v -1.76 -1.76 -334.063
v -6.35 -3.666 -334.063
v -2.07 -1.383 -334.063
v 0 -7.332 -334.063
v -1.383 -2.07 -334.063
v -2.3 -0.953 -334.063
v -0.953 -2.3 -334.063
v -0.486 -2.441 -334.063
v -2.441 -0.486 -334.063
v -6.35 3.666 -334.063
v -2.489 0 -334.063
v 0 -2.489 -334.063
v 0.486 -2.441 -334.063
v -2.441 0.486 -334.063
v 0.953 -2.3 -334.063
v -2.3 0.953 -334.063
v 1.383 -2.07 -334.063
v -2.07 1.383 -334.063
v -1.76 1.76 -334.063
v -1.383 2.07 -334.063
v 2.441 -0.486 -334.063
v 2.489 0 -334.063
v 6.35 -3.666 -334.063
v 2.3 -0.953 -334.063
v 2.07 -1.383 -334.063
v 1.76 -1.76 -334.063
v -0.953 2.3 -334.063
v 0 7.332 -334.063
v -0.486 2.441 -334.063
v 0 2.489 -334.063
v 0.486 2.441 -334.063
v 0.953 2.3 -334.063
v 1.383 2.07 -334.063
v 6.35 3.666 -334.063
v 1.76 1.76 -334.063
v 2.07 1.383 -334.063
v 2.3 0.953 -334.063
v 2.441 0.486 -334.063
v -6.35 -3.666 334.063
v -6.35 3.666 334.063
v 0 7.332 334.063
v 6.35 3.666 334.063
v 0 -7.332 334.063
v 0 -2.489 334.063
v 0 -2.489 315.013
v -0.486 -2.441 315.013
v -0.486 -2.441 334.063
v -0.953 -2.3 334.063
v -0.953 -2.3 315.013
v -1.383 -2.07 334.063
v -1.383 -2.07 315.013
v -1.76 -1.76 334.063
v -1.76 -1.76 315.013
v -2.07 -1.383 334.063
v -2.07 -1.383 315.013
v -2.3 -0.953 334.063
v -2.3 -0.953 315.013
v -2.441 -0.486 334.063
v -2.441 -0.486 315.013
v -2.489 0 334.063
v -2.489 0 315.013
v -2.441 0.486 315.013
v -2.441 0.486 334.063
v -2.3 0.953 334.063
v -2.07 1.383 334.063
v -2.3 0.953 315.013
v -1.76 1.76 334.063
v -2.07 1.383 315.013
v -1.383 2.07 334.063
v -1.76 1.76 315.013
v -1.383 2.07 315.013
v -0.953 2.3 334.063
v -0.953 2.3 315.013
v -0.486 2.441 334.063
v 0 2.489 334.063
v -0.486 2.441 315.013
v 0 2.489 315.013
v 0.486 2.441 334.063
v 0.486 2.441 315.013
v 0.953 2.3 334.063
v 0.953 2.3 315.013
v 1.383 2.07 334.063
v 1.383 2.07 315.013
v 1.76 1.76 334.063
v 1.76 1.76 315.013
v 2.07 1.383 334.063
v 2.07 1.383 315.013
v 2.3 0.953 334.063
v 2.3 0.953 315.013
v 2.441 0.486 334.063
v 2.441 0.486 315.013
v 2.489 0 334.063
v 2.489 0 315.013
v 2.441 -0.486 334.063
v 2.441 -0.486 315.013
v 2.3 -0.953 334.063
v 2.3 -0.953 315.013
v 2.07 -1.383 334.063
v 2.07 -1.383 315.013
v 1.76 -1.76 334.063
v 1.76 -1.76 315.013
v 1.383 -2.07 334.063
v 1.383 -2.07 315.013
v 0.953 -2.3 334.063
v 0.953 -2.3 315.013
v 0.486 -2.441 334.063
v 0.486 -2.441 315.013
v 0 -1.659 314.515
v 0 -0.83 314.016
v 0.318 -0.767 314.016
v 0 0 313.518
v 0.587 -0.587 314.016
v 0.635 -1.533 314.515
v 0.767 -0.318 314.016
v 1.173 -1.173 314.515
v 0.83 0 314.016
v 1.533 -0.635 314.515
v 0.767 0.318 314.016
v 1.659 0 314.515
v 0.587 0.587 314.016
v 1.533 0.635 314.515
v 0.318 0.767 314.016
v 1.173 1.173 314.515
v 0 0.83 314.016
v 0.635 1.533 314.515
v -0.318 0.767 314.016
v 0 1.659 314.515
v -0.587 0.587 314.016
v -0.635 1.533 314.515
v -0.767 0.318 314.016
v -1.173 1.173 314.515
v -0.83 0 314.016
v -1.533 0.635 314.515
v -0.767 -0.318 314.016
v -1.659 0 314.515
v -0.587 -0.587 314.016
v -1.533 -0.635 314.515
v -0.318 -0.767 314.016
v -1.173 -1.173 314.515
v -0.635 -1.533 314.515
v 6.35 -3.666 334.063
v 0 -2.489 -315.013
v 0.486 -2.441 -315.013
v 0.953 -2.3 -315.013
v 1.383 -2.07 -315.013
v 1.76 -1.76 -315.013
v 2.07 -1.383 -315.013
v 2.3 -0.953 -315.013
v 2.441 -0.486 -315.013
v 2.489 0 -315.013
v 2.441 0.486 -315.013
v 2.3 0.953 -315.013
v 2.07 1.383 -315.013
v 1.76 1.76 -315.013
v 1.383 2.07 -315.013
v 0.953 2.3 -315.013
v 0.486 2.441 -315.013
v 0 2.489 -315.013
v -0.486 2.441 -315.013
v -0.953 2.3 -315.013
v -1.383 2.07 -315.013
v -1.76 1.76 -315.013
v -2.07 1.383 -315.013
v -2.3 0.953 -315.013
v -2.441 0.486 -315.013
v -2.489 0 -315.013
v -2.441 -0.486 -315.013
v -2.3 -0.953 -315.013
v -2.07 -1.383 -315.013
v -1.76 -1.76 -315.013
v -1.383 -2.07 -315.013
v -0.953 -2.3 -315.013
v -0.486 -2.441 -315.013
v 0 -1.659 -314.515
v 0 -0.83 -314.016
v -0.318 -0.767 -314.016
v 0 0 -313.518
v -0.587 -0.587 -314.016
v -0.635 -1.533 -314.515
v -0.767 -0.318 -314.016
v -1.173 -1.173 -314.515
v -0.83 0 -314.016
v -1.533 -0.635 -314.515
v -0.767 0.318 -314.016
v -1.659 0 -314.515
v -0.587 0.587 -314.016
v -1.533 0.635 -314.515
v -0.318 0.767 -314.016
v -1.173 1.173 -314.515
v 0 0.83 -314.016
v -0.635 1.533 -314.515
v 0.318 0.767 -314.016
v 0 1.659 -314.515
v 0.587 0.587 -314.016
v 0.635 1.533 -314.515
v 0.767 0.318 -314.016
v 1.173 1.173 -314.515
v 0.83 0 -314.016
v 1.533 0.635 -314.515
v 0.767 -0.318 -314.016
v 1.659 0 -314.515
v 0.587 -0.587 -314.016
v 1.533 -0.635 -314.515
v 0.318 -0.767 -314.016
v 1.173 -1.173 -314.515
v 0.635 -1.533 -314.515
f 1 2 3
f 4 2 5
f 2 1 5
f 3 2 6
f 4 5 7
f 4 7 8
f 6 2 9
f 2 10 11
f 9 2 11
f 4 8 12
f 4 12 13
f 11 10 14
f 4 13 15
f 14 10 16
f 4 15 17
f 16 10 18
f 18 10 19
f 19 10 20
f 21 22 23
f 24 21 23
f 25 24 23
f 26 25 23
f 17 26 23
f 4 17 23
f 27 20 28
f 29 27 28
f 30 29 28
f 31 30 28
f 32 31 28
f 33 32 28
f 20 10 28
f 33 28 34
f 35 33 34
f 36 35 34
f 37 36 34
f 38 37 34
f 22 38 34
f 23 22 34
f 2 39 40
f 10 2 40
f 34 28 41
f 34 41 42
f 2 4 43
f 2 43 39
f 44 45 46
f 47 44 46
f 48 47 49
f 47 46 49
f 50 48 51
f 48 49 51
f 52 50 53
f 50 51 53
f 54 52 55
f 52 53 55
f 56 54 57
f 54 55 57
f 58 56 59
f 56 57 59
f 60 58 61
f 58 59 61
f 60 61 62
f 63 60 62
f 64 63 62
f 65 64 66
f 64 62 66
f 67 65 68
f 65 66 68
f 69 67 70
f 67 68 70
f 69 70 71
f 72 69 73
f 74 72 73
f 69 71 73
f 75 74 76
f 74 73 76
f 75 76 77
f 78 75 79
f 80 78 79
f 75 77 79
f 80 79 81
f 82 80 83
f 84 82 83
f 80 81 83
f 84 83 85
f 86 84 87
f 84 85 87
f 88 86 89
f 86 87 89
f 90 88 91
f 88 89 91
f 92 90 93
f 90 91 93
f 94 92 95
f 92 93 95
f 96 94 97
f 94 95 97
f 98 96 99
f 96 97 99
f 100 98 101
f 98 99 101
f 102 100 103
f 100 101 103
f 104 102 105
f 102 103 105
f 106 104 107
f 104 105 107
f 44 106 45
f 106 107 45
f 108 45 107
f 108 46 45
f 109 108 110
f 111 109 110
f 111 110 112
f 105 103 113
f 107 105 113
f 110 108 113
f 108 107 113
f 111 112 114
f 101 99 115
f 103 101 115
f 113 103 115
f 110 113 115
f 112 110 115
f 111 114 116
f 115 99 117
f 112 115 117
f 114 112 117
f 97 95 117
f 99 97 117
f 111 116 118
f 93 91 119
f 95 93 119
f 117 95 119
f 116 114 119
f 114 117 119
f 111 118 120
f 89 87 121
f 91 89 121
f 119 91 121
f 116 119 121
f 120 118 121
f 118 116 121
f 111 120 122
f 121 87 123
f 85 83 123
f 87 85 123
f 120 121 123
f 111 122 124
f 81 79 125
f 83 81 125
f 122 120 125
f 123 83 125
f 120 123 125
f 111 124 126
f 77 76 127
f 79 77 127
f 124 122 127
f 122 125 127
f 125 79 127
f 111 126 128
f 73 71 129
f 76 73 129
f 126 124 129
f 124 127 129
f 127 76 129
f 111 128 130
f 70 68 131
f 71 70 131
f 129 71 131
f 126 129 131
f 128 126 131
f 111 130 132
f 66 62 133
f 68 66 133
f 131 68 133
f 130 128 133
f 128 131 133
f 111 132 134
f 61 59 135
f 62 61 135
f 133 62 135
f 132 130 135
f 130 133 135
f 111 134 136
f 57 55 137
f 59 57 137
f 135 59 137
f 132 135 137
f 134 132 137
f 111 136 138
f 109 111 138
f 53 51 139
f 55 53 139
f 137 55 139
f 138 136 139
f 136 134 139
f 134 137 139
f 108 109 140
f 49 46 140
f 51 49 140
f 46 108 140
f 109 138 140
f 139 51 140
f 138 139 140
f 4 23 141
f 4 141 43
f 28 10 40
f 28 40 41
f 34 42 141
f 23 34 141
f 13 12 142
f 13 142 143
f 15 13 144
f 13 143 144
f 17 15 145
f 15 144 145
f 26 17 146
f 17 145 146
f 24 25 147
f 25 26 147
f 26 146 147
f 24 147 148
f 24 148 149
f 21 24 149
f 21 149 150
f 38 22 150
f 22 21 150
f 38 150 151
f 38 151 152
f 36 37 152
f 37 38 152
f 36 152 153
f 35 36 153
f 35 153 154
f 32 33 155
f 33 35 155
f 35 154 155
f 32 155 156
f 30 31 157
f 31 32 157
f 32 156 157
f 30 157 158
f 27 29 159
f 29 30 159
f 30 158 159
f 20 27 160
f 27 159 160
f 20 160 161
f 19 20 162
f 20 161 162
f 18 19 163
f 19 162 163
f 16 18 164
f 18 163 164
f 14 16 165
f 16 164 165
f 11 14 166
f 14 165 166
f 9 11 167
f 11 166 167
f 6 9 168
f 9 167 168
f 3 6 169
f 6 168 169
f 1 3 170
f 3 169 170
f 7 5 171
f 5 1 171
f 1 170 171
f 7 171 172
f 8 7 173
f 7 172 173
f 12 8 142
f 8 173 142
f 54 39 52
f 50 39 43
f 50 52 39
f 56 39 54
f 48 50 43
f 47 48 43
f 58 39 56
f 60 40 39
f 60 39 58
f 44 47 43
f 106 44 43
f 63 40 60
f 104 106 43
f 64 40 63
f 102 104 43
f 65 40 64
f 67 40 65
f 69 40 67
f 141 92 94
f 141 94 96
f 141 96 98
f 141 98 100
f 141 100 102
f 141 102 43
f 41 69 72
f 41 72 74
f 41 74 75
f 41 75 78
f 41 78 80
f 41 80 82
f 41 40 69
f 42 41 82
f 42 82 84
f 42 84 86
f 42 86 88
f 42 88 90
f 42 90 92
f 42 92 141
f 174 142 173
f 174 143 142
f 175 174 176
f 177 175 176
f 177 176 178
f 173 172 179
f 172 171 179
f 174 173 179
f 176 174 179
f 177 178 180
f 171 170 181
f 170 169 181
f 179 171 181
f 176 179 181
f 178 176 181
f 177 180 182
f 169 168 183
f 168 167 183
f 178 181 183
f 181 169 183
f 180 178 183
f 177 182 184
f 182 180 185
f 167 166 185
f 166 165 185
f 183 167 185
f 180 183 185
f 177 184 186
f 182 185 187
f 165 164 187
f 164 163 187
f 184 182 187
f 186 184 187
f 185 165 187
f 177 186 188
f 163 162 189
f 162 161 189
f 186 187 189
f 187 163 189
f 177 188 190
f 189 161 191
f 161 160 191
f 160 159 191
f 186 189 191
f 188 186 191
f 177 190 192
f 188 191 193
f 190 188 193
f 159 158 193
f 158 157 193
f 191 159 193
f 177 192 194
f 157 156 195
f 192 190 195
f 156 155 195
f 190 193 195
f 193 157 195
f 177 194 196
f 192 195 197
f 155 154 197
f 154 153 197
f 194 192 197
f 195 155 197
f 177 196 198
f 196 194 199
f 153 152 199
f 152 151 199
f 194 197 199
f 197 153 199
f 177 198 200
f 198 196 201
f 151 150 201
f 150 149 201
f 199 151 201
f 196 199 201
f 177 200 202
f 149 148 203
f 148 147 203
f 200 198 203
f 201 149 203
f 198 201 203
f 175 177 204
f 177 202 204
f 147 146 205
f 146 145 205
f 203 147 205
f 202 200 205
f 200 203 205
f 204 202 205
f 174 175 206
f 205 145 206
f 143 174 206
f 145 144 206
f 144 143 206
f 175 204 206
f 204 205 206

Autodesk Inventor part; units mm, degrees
ref_plane "YZ Plane" through (0, 0, 0) normal (1, 0, 0) x (0, 1, 0)
ref_plane "XZ Plane" through (0, 0, 0) normal (0, 1, 0) x (-1, 0, 0)
ref_plane "XY Plane" through (0, 0, 0) normal (0, 0, 1) x (1, 0, 0)
sketch "Sketch1" plane through (0, 0, 0) normal (0, 0, 1) x (1, 0, 0)
  line L0 (0, 7.3323) -> (6.35, 3.6662)
  line L1 (6.35, 3.6662) -> (6.35, -3.6662)
  line L2 (6.35, -3.6662) -> (0, -7.3323)
  line L3 (0, -7.3323) -> (-6.35, -3.6662)
  line L4 (-6.35, -3.6662) -> (-6.35, 3.6662)
  line L5 (-6.35, 3.6662) -> (0, 7.3323)
  point P0 (0, 0)
  point P1 (0, 0)
  dimension "d1" = 12.7
extrude "Extrusion1" add sketch "Sketch1" along normal mid plane 668.1267
sketch "Sketch2" plane through (0, 0, 334.0633) normal (0, 0, 1) x (1, 0, 0)
  point P0 (0, 0)
hole "Hole1" at (0, 0, 334.0633) direction (0, 0, -1) diameter 4.9784 depth 19.05 tip angle 118 thread size "1/4-20 UNC" class "2B" standard "ANSI Unified Screw Threads"
mirror "Mirror1" about plane through (0, 0, 0) normal (0, 0, 1) of "Hole1"
properties part number "0.5_Jack_Shaft" material "Aluminum, 6061-T6"
